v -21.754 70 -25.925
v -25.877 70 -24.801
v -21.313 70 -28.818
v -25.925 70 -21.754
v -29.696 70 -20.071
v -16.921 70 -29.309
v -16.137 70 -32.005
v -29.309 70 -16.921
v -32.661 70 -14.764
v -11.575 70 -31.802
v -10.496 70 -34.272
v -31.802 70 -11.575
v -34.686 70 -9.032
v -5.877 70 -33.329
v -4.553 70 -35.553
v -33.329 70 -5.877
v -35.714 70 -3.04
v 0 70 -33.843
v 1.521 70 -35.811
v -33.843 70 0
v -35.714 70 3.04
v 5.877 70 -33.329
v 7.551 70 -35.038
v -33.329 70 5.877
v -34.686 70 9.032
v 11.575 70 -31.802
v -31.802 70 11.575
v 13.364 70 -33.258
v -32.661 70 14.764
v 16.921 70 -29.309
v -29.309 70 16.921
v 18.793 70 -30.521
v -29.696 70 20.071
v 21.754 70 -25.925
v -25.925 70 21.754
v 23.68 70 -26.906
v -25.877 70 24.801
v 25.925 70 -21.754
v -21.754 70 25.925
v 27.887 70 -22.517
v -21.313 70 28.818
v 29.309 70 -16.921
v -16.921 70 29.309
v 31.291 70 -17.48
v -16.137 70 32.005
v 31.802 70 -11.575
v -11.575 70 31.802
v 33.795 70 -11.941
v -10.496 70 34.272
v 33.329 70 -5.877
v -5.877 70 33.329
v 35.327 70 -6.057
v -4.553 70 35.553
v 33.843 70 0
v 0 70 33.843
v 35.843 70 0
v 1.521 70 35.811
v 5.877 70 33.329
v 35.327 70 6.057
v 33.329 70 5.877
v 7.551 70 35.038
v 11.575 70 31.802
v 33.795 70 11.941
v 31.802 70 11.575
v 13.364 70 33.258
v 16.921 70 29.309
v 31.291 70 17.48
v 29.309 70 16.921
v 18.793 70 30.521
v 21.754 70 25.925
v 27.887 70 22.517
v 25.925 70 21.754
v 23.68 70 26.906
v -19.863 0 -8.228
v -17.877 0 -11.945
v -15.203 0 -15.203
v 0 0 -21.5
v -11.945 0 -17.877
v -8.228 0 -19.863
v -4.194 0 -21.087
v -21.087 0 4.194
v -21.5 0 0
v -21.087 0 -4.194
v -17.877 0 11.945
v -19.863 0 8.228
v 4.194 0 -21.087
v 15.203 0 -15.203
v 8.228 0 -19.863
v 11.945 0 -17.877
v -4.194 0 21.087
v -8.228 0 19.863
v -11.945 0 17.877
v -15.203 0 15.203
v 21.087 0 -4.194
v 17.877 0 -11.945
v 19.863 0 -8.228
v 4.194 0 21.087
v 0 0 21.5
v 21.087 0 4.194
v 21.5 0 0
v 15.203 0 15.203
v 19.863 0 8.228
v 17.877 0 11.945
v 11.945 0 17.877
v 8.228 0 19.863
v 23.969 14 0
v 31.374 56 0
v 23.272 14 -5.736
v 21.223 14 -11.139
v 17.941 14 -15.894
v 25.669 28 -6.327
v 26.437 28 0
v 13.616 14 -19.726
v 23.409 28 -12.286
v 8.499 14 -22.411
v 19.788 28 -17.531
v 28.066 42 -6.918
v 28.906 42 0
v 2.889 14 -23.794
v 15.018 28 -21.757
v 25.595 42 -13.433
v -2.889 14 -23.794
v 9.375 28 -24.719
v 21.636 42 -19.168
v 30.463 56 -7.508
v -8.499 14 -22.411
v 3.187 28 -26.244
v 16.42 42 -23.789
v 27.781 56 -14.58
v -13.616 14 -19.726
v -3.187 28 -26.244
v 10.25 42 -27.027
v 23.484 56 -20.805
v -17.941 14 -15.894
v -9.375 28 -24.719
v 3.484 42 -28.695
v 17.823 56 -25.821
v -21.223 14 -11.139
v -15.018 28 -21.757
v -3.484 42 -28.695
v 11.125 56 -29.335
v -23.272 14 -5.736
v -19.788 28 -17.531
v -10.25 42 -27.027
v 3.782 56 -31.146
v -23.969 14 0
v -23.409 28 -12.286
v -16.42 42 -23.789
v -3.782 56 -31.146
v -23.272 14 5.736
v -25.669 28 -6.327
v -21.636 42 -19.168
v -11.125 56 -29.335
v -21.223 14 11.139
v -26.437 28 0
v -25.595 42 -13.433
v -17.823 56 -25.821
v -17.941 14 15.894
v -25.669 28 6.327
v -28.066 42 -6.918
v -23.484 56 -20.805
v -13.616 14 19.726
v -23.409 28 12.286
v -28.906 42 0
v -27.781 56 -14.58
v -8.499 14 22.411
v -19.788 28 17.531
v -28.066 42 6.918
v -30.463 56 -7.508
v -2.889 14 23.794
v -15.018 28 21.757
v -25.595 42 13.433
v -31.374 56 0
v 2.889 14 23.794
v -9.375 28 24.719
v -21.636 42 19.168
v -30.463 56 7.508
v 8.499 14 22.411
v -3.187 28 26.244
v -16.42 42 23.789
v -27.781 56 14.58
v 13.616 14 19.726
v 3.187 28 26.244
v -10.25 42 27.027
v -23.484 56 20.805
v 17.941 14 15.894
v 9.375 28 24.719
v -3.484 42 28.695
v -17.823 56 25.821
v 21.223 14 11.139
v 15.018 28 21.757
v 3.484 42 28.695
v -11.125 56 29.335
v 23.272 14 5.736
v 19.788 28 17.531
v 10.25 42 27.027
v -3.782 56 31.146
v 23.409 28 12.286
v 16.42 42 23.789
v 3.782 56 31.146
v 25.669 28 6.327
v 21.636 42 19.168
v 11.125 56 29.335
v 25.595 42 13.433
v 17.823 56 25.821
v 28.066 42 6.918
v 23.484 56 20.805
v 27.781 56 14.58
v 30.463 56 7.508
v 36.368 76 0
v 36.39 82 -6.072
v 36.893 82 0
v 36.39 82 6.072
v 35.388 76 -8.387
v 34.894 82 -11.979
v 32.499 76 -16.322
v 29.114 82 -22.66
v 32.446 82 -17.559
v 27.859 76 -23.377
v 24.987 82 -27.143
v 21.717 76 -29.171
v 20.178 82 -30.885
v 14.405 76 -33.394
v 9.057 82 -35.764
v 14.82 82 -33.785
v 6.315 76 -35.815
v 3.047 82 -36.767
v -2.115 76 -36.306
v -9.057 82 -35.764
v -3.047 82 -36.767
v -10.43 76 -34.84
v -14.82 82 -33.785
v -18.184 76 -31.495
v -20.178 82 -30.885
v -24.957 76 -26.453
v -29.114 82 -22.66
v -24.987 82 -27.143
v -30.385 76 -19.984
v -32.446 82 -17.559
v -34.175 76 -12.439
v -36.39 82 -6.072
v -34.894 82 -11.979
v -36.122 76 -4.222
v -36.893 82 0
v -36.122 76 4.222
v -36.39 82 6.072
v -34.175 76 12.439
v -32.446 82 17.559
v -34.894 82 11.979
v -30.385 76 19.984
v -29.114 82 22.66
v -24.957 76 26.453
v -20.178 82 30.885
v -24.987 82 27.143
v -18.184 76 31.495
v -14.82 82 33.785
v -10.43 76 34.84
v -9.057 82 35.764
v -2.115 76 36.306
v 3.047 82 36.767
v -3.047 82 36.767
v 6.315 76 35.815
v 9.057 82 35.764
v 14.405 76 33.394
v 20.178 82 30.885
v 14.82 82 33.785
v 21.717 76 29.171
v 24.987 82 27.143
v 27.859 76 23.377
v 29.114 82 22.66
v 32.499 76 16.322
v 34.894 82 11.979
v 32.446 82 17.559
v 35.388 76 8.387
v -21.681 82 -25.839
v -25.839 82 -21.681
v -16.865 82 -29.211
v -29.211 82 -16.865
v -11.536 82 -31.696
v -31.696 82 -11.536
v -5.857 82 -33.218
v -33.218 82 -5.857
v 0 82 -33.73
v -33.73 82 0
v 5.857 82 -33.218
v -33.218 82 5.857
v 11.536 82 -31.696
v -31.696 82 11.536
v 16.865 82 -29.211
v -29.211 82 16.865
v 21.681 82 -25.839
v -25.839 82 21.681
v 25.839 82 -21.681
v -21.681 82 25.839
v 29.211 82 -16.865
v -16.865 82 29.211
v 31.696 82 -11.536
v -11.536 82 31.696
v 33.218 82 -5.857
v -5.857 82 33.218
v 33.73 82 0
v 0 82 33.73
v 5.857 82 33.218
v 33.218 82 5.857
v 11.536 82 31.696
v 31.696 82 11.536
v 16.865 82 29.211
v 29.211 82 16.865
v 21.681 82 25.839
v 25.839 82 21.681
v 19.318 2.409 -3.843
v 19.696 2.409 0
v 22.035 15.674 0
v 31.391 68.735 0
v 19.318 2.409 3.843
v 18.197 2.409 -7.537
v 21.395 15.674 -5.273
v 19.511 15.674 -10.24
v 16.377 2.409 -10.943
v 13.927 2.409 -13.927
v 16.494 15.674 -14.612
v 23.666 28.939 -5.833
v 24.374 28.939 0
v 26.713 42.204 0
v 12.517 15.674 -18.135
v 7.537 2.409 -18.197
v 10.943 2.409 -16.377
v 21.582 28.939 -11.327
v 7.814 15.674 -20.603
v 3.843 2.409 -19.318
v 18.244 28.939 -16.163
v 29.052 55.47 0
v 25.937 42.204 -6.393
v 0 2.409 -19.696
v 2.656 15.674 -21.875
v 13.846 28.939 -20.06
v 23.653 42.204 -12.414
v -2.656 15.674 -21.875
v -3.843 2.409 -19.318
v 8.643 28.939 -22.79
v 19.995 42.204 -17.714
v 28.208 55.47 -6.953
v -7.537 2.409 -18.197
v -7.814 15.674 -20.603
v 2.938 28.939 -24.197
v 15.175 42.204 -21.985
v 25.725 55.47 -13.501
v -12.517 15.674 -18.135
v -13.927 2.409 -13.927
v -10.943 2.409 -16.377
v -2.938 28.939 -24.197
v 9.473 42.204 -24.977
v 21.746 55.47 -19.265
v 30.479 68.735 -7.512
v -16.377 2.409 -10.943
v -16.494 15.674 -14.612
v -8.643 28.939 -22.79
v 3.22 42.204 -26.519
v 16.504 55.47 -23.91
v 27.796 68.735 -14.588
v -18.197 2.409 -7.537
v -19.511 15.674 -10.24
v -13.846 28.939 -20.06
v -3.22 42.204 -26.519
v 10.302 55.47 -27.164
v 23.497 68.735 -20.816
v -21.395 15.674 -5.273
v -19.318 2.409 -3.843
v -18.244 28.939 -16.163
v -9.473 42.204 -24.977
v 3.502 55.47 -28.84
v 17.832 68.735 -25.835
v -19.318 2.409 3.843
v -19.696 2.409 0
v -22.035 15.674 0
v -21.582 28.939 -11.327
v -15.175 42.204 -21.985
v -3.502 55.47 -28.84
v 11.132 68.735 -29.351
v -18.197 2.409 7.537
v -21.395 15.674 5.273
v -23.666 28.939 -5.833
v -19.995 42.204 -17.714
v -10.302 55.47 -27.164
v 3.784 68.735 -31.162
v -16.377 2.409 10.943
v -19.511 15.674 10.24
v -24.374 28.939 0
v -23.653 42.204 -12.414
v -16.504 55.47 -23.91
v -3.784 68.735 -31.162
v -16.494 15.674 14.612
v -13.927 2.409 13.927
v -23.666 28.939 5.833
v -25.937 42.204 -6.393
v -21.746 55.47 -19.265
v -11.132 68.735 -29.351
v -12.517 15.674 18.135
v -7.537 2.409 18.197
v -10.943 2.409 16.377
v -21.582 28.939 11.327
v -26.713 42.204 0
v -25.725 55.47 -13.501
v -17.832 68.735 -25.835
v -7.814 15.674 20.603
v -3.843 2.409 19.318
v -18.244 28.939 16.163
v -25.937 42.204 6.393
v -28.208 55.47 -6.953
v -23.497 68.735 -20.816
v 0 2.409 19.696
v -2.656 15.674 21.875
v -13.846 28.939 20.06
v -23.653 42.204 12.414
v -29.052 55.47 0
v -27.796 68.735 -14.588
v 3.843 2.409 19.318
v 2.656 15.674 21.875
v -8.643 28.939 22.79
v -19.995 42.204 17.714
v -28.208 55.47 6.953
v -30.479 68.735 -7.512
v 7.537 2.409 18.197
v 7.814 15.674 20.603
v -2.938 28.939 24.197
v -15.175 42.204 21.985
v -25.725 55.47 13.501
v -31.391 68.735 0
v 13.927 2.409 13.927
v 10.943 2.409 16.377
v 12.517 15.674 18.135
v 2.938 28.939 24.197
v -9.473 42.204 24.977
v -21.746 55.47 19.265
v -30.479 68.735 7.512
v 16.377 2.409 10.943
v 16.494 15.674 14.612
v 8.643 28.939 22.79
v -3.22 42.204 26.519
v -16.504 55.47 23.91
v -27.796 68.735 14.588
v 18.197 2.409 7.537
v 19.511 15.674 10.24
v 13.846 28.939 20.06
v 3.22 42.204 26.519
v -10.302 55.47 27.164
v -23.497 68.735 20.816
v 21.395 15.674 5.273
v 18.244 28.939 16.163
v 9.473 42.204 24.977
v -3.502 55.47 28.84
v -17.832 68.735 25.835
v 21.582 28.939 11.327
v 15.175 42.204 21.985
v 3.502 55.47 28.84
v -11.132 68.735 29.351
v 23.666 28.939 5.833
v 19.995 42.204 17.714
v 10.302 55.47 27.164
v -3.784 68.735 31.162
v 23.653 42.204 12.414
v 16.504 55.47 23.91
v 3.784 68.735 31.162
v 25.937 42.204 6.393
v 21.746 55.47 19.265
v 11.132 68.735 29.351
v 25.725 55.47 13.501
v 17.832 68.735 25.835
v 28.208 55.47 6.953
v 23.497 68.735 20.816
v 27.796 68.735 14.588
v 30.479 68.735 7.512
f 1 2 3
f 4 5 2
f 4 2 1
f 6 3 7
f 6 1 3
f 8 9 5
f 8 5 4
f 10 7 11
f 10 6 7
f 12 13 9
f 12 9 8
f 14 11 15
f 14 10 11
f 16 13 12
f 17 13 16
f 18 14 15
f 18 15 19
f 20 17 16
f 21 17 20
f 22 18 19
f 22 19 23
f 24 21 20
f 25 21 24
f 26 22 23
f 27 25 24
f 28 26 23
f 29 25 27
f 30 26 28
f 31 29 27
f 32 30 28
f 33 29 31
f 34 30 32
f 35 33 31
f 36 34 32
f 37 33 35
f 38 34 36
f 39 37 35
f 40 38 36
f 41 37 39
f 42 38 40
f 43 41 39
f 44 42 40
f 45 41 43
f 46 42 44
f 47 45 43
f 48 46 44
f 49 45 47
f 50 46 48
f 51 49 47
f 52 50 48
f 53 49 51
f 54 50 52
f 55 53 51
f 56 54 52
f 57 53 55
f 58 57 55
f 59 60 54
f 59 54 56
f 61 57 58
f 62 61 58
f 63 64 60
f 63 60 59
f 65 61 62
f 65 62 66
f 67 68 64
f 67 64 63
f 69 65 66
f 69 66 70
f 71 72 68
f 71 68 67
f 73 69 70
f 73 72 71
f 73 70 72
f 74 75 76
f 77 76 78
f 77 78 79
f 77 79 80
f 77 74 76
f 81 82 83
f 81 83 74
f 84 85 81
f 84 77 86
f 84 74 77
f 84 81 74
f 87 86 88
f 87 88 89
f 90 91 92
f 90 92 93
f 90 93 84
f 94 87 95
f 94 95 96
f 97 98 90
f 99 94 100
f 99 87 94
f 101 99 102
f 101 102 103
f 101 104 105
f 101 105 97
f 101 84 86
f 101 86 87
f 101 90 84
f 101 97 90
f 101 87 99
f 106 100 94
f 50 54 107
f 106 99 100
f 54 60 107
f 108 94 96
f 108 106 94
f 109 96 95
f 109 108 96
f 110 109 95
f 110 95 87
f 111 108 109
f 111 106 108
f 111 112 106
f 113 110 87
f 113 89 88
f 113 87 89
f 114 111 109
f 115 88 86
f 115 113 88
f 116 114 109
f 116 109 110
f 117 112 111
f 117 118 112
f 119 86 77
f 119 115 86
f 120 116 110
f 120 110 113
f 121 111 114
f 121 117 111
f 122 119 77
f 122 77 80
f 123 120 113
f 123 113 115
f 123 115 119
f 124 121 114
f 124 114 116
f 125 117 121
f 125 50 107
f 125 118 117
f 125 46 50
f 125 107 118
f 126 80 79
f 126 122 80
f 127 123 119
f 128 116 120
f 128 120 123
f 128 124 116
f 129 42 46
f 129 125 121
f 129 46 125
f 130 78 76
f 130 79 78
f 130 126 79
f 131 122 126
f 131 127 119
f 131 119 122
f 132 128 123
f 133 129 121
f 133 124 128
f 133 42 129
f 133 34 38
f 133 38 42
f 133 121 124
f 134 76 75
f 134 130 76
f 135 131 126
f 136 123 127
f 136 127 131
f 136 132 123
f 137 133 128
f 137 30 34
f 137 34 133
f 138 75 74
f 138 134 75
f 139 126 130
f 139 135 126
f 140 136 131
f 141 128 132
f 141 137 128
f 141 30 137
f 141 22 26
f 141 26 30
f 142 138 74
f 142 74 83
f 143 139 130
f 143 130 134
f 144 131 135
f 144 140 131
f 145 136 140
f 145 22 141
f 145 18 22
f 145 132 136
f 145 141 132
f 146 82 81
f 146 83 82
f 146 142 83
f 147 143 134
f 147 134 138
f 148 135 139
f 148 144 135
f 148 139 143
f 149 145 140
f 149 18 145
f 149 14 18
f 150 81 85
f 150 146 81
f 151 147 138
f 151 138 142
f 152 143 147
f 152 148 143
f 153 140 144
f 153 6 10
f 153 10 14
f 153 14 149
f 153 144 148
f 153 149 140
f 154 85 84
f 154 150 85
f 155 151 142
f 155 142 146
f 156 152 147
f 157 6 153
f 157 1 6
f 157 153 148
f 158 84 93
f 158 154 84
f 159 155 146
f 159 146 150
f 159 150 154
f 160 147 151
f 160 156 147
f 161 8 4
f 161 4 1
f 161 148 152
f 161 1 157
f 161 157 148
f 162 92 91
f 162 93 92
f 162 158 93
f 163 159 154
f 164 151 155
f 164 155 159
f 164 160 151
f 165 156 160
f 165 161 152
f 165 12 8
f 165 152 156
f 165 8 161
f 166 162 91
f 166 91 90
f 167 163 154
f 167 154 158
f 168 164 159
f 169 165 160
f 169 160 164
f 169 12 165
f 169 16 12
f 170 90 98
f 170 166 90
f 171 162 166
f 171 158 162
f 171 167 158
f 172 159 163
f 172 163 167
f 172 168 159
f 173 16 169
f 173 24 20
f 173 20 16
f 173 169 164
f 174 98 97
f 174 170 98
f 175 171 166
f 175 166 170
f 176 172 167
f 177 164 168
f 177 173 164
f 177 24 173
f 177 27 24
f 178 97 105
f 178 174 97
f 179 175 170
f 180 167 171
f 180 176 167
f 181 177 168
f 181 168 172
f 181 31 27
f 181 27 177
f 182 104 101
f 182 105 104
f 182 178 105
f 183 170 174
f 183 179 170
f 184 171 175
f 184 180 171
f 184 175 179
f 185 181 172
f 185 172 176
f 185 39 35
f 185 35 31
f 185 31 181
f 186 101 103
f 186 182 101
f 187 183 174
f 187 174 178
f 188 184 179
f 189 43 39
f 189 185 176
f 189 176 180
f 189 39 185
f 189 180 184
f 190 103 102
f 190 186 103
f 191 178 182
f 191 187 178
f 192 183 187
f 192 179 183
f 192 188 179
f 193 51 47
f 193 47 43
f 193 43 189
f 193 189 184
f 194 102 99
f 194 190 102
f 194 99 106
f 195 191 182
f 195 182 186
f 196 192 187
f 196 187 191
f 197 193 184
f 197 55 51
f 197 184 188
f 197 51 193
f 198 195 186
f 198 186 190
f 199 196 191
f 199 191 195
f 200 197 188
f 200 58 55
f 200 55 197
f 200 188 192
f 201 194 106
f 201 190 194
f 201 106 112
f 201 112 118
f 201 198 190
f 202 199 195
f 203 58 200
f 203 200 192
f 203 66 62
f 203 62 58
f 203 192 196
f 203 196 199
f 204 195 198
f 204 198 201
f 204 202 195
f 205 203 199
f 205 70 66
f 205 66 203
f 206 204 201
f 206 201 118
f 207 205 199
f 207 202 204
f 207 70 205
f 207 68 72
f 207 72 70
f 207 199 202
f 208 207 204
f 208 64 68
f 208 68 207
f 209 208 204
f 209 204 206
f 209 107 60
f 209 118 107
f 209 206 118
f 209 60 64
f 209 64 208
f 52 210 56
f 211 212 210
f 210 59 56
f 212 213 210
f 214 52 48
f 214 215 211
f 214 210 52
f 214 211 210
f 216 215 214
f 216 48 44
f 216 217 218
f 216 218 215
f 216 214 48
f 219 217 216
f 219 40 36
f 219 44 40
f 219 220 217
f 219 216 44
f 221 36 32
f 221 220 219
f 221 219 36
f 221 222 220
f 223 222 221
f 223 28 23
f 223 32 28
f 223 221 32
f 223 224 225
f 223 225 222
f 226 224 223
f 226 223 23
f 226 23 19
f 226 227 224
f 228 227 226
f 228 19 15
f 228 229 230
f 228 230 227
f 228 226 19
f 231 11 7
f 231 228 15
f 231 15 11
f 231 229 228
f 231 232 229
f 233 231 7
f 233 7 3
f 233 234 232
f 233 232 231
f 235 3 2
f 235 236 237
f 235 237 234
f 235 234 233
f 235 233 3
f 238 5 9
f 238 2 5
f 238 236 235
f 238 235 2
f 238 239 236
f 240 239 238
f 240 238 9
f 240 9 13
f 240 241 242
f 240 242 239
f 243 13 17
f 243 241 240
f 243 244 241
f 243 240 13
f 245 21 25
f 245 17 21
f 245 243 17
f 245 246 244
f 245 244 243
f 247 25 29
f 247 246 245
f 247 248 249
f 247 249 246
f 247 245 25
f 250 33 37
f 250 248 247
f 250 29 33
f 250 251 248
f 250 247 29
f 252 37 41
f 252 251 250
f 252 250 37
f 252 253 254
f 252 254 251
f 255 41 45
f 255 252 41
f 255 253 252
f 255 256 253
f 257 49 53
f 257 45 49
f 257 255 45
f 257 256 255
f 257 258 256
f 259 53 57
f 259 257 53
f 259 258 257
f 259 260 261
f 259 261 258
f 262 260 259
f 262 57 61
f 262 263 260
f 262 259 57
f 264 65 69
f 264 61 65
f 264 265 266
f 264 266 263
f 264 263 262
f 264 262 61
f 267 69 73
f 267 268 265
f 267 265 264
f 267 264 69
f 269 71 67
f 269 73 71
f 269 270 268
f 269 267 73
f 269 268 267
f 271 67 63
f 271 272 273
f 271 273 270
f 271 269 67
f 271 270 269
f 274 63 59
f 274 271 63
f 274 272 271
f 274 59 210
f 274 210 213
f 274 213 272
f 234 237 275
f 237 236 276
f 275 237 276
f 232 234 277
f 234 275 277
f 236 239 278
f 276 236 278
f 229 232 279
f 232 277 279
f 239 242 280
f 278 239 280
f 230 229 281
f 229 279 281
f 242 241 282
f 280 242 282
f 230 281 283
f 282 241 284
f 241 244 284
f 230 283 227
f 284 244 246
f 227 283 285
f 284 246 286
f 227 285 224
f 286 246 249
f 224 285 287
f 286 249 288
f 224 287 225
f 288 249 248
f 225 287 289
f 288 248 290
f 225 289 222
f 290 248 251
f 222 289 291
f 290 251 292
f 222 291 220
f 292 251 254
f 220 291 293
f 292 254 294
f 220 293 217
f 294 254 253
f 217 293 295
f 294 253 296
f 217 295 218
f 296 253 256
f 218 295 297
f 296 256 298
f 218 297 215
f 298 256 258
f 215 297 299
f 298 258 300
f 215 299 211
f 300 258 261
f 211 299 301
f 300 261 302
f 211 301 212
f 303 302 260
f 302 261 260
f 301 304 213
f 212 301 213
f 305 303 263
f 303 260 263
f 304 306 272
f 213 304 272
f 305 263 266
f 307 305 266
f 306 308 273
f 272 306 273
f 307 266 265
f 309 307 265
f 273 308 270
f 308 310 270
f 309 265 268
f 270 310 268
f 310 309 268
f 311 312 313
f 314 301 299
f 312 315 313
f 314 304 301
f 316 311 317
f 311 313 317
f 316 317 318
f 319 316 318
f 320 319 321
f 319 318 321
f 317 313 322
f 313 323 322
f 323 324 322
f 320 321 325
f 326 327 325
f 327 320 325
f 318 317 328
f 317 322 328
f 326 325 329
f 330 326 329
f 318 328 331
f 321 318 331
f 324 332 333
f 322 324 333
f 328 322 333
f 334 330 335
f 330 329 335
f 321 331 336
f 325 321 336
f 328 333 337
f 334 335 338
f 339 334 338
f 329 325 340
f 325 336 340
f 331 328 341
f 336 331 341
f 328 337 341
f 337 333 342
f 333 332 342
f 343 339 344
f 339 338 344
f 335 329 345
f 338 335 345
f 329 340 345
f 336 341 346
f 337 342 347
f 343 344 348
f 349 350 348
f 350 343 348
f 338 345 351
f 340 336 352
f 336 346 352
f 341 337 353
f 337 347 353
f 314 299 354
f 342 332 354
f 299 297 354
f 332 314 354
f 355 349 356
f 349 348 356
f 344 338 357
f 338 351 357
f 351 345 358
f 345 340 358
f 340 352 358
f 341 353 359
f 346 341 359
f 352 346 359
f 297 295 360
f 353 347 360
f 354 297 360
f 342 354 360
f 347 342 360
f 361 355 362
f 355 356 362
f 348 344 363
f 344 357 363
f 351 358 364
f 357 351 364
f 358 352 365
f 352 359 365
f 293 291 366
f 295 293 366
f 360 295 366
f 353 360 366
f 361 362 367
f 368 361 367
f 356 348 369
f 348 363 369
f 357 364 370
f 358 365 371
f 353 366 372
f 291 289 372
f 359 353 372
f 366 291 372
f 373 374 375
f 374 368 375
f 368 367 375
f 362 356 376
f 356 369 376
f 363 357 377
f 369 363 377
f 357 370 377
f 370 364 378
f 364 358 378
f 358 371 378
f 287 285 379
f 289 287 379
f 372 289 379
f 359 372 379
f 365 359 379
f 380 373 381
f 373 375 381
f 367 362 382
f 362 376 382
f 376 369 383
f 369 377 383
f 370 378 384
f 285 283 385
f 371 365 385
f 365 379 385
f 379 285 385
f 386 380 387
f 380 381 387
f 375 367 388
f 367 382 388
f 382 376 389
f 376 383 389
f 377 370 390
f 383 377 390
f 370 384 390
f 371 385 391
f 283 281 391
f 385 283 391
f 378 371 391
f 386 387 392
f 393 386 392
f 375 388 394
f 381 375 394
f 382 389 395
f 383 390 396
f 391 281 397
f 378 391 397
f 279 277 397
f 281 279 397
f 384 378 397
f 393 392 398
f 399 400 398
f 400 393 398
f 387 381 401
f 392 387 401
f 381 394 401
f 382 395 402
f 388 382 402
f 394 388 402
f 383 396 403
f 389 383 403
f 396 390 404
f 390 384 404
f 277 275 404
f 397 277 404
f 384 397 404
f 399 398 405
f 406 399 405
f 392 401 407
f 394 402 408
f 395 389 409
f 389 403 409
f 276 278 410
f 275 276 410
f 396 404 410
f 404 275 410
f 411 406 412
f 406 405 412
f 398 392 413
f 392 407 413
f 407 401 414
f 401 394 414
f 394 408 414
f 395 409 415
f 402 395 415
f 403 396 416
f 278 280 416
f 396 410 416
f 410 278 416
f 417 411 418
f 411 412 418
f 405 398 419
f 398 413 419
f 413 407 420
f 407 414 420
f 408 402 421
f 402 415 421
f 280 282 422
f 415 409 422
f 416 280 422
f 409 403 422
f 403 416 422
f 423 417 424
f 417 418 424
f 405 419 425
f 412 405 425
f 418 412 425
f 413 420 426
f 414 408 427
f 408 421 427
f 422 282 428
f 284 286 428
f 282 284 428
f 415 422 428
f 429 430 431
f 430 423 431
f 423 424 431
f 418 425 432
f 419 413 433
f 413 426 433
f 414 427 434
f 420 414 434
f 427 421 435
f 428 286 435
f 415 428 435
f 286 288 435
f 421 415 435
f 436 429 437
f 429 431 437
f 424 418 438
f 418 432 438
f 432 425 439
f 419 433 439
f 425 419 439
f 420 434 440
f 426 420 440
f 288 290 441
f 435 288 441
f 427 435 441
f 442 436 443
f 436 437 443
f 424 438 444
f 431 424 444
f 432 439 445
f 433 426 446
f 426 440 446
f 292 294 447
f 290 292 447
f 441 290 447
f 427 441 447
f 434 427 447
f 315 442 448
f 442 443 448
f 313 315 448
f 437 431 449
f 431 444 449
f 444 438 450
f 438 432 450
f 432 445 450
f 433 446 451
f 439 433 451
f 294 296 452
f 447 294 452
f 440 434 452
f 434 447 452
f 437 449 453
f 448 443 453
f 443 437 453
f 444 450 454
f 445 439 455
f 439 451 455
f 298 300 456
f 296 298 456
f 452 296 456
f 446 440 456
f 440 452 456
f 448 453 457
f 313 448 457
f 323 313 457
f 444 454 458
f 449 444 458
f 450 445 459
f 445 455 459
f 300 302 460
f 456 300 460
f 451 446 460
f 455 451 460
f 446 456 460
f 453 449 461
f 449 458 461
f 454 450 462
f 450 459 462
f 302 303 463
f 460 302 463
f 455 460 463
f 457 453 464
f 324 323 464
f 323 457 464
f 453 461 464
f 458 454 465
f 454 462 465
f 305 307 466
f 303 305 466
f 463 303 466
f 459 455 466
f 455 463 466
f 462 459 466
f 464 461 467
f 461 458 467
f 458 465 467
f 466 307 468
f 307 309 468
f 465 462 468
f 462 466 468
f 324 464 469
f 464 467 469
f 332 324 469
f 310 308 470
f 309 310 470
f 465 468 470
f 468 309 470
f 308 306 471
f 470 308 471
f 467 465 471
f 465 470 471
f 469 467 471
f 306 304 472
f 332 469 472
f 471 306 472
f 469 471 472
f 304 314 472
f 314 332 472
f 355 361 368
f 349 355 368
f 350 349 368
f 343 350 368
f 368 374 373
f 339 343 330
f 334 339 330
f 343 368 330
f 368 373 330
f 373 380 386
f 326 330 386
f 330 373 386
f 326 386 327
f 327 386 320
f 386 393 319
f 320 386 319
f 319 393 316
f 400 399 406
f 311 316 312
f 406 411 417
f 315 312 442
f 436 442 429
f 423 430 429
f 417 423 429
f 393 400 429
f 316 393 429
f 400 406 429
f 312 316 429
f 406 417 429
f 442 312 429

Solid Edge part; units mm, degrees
sketch "Sketch1" plane through (0, 0, 0) normal (0, 0, 1) x (1, 0, 0)
  line L0 (35.8429, 70) -> (36.8928, 82)
  line L1 (33.7303, 82) -> (36.8928, 82)
  line L2 (19.6963, 2.409) -> (33.7303, 82)
  line L3 (0, 2.409) -> (19.6963, 2.409)
  line L4 (0, 0) -> (0, 2.409)
  line L5 (0, 0) -> (21.5, 0)
  line L6 (21.5, 0) -> (33.8429, 70)
  line L7 (33.8429, 70) -> (35.8429, 70)
revolve "RevolvedProtrusion1" add sketch "Sketch1" angle 360 about axis through (0, 82, 0) along (0, -1, 0)
properties material "Polietileno, baja densidad"
